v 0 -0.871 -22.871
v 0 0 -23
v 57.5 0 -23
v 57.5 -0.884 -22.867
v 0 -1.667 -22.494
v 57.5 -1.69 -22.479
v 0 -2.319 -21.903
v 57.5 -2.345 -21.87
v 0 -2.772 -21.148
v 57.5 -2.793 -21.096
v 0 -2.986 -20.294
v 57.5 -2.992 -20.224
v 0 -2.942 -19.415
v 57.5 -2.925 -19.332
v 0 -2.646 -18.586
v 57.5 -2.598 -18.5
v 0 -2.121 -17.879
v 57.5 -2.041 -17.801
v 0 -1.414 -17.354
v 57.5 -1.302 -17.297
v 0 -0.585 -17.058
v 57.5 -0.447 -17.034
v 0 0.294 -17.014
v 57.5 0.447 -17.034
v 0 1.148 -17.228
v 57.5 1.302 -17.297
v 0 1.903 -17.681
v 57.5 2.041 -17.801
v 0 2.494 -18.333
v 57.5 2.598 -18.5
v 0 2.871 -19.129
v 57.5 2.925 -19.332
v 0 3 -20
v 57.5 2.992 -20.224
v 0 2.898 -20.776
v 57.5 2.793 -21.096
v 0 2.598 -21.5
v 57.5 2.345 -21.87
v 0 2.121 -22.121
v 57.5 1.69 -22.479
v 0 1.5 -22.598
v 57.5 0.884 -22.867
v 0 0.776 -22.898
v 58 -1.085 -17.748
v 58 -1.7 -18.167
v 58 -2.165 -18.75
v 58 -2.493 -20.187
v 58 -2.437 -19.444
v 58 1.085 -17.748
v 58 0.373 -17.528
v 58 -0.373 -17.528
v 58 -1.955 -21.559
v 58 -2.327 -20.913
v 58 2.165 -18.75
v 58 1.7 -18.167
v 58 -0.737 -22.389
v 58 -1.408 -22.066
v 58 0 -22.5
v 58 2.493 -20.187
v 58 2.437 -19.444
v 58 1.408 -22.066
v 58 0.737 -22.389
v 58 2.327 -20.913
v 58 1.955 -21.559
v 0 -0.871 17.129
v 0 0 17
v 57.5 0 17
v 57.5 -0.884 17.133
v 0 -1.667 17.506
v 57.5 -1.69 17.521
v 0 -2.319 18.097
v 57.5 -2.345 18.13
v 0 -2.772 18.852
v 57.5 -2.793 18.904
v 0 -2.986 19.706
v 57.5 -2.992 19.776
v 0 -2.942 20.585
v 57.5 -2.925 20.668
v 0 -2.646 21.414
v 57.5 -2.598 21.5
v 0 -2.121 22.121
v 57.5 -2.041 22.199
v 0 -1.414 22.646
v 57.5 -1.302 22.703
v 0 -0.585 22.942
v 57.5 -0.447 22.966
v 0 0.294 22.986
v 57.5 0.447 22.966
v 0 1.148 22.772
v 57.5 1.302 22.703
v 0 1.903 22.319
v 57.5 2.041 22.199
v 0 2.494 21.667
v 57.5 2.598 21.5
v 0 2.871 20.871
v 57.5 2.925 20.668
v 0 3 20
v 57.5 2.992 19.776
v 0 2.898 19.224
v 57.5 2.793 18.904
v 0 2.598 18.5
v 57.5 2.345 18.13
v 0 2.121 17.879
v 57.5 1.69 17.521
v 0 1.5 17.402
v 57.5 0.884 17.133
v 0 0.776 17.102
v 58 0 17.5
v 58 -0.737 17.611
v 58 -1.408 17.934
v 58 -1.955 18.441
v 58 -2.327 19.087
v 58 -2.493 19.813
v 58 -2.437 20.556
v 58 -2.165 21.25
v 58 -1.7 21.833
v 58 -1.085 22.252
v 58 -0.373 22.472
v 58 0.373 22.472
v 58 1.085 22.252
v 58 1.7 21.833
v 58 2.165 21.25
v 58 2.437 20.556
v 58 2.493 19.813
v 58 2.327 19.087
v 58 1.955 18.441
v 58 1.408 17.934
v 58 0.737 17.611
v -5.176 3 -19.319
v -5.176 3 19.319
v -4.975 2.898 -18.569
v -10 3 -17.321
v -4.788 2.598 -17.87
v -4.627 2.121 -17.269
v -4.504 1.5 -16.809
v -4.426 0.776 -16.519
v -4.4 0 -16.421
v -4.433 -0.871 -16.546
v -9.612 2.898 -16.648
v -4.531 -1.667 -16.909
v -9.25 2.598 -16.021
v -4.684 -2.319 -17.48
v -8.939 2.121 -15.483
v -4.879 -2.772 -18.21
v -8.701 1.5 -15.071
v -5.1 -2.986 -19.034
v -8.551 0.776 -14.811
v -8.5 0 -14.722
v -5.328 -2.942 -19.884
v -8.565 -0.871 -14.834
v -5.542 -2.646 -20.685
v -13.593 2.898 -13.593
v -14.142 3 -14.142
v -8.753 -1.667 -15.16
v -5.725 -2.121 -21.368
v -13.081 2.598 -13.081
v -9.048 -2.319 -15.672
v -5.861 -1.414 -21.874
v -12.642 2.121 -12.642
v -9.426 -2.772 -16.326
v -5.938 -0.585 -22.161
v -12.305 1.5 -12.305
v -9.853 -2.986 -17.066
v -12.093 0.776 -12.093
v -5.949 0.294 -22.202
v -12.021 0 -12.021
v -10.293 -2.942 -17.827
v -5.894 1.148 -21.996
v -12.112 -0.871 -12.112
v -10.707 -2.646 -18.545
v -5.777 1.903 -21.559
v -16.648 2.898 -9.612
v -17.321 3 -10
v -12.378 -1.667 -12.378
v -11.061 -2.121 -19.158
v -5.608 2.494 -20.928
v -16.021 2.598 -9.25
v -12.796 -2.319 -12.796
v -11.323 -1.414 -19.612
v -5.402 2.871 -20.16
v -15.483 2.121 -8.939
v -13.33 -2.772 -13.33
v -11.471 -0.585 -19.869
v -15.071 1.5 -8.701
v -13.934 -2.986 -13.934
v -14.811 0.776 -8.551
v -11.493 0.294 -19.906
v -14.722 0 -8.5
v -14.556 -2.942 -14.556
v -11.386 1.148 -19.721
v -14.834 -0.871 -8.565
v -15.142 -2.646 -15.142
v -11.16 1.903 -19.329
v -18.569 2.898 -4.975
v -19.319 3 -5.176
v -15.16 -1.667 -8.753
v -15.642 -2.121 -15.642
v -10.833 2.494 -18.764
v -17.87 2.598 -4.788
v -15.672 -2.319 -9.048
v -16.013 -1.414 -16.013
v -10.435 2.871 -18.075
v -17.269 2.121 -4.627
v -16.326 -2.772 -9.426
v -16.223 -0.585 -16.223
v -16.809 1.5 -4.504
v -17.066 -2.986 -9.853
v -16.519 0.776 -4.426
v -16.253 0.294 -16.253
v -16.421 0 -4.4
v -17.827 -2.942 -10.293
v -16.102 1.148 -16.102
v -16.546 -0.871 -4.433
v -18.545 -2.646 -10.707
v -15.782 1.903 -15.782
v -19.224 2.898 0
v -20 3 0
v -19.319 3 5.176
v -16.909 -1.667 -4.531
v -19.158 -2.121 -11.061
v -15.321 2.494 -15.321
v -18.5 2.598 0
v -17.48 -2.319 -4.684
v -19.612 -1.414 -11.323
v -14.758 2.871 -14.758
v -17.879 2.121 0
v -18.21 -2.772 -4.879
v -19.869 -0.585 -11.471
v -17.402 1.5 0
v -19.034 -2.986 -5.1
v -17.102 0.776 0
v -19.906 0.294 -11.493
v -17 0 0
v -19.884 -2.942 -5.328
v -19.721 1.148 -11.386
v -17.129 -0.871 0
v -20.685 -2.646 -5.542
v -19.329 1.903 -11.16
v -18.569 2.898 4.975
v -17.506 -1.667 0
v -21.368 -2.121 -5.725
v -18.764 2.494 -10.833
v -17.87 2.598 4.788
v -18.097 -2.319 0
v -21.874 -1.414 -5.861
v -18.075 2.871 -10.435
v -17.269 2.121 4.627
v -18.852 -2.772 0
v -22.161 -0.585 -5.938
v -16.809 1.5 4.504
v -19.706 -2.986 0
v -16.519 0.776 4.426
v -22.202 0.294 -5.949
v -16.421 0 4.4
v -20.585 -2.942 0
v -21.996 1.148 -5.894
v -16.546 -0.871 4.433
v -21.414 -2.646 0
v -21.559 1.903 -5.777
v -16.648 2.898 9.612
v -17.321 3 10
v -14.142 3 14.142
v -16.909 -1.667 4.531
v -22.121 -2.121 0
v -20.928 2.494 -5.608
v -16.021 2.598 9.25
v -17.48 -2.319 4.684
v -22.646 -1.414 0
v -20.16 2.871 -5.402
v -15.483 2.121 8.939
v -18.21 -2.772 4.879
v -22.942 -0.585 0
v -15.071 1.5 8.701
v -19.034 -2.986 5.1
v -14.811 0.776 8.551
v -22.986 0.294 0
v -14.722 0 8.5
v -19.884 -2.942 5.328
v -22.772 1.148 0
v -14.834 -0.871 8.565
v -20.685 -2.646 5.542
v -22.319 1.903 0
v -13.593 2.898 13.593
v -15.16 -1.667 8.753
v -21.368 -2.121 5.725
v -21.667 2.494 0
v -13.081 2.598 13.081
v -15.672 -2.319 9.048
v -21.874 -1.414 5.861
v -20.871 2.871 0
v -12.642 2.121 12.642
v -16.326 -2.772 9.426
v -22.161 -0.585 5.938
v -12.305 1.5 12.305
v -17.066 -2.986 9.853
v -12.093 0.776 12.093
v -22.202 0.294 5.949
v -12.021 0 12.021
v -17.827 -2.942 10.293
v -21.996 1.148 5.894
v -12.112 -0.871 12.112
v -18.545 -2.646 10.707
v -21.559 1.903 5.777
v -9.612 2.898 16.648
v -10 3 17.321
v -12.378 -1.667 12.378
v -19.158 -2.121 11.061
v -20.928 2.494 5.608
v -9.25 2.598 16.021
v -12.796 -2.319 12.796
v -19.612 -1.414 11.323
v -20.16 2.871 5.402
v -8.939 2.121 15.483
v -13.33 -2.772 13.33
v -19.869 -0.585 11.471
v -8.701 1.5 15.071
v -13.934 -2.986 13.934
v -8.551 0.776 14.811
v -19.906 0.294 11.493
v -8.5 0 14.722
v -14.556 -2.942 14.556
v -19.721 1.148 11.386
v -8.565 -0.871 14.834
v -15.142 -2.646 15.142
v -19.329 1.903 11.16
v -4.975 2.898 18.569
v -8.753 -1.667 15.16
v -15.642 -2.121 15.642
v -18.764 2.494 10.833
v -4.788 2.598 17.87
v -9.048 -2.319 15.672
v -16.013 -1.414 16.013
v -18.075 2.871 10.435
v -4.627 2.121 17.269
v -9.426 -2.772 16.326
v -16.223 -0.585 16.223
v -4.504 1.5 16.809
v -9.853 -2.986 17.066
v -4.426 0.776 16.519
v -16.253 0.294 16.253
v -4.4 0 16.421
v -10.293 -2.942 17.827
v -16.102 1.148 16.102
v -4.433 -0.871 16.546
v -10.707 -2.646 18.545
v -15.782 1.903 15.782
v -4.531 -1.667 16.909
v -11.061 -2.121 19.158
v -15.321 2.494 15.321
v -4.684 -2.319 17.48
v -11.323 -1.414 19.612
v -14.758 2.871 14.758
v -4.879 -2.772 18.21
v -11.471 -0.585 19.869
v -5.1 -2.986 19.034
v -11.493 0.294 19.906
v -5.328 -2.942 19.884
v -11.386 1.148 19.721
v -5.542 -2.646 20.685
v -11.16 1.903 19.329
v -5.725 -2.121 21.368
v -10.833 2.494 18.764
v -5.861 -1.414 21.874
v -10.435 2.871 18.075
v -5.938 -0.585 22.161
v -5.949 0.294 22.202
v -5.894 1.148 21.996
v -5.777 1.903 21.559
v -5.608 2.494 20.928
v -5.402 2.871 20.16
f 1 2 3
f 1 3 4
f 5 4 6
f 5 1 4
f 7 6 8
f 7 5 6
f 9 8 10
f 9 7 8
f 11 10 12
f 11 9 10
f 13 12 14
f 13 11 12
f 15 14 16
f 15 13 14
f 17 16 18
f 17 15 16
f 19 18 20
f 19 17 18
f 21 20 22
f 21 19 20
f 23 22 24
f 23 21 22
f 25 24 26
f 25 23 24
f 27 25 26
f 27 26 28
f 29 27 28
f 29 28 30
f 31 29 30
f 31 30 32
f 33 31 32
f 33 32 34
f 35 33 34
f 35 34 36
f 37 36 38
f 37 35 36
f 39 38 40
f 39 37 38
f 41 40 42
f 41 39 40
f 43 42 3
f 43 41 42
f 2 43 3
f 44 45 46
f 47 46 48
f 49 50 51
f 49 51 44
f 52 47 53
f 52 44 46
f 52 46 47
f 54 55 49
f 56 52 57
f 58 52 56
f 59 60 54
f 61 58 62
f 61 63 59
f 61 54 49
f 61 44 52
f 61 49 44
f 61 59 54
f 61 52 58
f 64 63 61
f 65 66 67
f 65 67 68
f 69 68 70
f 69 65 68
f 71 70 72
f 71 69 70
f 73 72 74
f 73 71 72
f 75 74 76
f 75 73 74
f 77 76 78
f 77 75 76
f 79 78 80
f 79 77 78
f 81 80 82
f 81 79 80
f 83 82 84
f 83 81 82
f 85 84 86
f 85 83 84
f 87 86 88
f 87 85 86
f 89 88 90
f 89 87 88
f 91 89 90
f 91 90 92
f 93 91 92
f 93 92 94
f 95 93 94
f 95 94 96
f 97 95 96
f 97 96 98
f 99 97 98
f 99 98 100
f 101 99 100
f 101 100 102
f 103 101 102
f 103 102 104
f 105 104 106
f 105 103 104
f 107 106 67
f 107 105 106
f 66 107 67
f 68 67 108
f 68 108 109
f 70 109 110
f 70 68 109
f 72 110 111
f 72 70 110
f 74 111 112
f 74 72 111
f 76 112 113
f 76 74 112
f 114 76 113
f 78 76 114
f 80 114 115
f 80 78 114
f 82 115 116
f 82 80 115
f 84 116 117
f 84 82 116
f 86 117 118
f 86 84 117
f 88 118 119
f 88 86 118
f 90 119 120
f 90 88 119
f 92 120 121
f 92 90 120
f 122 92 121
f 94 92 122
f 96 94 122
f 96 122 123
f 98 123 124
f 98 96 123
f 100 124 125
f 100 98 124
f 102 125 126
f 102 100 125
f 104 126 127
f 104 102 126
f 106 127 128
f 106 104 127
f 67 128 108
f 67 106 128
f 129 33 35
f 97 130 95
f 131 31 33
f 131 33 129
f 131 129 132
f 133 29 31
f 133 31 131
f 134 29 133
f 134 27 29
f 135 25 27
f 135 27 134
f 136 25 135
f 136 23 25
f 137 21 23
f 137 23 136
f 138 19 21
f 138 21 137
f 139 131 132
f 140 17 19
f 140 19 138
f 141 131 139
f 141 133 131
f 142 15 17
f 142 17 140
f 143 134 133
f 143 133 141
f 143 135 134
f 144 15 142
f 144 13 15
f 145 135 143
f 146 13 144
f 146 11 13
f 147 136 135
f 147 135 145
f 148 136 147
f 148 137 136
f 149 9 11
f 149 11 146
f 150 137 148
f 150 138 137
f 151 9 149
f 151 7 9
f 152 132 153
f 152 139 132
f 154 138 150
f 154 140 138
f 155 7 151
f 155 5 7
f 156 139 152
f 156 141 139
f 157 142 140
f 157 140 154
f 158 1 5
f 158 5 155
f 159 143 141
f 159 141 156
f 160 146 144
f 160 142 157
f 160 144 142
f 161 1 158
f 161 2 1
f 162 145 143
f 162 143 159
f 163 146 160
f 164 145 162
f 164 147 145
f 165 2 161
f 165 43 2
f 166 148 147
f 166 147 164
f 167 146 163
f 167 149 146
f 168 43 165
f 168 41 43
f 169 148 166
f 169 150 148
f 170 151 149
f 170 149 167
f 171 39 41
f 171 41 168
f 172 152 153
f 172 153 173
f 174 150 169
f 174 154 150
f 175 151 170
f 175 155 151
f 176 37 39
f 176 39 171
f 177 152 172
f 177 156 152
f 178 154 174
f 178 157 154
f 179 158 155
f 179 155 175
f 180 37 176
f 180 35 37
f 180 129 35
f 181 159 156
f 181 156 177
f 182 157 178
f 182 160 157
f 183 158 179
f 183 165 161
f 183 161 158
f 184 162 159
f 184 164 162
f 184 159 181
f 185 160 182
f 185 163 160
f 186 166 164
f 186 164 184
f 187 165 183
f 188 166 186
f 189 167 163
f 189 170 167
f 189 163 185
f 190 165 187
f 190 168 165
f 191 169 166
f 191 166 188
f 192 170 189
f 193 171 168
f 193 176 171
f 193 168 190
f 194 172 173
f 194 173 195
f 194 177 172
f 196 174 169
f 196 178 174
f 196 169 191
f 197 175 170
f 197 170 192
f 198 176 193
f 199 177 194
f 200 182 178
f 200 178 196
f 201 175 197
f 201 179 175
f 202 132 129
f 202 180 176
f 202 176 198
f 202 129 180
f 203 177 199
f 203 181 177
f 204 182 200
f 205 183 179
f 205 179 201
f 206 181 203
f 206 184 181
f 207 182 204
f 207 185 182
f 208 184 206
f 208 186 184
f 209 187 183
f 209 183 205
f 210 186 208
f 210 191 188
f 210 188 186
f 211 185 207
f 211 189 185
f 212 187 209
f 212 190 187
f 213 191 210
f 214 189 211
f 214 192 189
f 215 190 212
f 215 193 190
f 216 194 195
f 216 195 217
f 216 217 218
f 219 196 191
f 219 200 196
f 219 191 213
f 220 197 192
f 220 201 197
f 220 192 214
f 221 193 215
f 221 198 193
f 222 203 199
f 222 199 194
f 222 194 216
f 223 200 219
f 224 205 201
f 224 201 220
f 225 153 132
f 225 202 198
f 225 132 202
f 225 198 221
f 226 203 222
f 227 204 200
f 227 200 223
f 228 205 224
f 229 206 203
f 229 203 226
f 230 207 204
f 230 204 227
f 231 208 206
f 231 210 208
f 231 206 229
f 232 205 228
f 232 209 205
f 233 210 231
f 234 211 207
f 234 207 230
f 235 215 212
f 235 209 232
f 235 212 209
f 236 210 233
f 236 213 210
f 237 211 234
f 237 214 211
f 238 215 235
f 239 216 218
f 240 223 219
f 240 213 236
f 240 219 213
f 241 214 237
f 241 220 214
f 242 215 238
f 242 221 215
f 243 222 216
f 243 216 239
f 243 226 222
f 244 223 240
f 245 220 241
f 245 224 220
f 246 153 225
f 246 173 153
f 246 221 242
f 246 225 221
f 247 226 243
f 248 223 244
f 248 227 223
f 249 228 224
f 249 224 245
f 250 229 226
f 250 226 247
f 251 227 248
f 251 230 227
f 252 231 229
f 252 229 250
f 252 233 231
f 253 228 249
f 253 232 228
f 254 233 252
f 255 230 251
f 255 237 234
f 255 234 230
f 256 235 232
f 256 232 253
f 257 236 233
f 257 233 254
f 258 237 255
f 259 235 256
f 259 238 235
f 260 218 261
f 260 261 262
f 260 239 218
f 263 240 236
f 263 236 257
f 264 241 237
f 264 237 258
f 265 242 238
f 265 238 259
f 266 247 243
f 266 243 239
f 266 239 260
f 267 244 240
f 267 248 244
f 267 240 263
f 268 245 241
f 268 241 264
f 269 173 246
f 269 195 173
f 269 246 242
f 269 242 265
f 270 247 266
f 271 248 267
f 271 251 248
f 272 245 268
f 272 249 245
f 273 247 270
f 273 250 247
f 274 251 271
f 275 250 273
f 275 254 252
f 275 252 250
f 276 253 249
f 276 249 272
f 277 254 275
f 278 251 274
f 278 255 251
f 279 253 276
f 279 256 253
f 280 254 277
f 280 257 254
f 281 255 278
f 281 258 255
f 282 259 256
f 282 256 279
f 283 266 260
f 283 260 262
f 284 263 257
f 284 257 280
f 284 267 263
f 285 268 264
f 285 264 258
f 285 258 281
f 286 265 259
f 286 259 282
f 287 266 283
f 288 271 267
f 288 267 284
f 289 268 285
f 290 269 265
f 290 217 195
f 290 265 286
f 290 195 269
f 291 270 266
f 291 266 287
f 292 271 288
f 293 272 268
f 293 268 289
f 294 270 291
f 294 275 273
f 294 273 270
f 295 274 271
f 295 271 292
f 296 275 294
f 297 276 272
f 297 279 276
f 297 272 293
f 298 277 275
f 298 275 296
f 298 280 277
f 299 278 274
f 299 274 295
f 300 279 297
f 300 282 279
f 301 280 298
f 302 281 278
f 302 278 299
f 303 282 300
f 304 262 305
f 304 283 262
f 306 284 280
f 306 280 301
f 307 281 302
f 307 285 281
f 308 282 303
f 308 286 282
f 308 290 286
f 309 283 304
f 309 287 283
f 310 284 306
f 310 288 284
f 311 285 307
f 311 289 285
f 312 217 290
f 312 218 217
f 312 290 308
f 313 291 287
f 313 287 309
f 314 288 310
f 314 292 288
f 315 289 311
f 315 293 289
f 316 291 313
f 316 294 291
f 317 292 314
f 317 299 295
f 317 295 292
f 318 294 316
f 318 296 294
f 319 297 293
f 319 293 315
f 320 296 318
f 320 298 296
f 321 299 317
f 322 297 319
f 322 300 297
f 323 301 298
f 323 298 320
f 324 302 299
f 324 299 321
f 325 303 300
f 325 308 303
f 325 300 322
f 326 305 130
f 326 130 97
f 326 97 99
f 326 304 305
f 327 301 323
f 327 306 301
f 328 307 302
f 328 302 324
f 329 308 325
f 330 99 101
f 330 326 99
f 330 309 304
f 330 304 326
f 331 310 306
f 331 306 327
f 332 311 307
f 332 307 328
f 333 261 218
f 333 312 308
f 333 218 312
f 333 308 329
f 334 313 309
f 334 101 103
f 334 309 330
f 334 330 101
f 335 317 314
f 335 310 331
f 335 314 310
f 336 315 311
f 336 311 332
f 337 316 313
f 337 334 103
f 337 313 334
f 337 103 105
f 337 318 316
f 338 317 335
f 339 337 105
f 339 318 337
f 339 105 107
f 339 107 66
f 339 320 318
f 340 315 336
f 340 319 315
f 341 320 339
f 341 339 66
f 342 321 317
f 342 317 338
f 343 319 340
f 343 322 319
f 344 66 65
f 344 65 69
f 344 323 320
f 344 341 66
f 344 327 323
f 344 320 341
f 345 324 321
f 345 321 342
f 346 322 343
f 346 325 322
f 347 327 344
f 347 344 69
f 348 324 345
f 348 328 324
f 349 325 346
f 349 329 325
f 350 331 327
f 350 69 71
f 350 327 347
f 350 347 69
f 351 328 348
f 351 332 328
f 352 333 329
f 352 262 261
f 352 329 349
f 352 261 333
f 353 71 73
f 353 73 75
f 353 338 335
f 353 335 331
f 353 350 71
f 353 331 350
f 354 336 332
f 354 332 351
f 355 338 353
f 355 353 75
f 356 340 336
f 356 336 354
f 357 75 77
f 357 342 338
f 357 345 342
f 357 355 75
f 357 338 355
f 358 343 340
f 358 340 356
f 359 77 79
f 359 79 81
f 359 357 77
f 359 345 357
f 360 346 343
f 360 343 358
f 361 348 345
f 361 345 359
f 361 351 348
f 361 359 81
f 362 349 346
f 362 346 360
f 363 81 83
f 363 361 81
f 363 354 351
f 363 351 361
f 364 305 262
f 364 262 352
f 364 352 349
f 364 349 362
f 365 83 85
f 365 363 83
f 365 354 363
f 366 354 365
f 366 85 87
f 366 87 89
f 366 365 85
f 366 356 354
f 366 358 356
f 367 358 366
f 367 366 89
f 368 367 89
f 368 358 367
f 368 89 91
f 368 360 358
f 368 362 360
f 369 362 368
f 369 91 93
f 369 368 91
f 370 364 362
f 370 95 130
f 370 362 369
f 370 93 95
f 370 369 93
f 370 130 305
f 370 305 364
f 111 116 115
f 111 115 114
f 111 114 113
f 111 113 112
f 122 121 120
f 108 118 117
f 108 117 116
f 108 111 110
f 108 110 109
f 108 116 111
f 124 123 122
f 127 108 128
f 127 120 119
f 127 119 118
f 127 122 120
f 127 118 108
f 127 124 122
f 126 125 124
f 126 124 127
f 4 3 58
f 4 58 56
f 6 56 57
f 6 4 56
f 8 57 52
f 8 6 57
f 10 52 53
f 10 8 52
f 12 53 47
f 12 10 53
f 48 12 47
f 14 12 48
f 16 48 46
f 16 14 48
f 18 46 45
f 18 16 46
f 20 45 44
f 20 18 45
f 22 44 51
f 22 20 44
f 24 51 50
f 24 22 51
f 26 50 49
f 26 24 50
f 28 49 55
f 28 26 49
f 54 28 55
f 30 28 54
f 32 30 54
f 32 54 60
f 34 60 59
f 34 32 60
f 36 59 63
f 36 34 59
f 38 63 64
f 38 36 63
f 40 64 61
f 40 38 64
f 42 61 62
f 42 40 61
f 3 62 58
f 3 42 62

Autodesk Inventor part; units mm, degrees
ref_plane "YZ Plane" through (0, 0, 0) normal (1, 0, 0) x (0, 1, 0)
ref_plane "XZ Plane" through (0, 0, 0) normal (0, 1, 0) x (-1, 0, 0)
ref_plane "XY Plane" through (0, 0, 0) normal (0, 0, 1) x (1, 0, 0)
sketch "Esboço1" plane through (0, 0, 0) normal (1, 0, 0) x (0, 1, 0)
  line L0 (0, 0) -> (15, 0)
  circle A0 centre (0, -20) radius 3
revolve "Revolução1" add sketch "Esboço1" angle 180 about axis through (0, 0, 0) along (0, 1, 0)
sketch "Esboço2" plane through (0, 0, 20) normal (1, 0, 0) x (0, 0, -1)
  circle A0 centre (0, 0) radius 3
  circle A1 centre (40, 0) radius 3
  point P0 (20, 0)
extrude "Extrusão1" add sketch "Esboço2" along normal blind 58
chamfer "Chanfro1" distance 0.5 angle 45 2 edges at (58, 0, -17) (58, 0, 23)
sketch "Esboço3" plane through (0, 0, 0) normal (0, 1, 0) x (-1, 0, 0)
  point P0 (0, 0)
thread "Rosca1" size "M6x1" class "6g" standard "ANSI Metric M Profile" length 35 offset 23
thread "Rosca2" size "M6x1" class "6g" standard "ANSI Metric M Profile" length 35
properties part number "parafuso u abraçadeira" material "Aço inoxidável"
